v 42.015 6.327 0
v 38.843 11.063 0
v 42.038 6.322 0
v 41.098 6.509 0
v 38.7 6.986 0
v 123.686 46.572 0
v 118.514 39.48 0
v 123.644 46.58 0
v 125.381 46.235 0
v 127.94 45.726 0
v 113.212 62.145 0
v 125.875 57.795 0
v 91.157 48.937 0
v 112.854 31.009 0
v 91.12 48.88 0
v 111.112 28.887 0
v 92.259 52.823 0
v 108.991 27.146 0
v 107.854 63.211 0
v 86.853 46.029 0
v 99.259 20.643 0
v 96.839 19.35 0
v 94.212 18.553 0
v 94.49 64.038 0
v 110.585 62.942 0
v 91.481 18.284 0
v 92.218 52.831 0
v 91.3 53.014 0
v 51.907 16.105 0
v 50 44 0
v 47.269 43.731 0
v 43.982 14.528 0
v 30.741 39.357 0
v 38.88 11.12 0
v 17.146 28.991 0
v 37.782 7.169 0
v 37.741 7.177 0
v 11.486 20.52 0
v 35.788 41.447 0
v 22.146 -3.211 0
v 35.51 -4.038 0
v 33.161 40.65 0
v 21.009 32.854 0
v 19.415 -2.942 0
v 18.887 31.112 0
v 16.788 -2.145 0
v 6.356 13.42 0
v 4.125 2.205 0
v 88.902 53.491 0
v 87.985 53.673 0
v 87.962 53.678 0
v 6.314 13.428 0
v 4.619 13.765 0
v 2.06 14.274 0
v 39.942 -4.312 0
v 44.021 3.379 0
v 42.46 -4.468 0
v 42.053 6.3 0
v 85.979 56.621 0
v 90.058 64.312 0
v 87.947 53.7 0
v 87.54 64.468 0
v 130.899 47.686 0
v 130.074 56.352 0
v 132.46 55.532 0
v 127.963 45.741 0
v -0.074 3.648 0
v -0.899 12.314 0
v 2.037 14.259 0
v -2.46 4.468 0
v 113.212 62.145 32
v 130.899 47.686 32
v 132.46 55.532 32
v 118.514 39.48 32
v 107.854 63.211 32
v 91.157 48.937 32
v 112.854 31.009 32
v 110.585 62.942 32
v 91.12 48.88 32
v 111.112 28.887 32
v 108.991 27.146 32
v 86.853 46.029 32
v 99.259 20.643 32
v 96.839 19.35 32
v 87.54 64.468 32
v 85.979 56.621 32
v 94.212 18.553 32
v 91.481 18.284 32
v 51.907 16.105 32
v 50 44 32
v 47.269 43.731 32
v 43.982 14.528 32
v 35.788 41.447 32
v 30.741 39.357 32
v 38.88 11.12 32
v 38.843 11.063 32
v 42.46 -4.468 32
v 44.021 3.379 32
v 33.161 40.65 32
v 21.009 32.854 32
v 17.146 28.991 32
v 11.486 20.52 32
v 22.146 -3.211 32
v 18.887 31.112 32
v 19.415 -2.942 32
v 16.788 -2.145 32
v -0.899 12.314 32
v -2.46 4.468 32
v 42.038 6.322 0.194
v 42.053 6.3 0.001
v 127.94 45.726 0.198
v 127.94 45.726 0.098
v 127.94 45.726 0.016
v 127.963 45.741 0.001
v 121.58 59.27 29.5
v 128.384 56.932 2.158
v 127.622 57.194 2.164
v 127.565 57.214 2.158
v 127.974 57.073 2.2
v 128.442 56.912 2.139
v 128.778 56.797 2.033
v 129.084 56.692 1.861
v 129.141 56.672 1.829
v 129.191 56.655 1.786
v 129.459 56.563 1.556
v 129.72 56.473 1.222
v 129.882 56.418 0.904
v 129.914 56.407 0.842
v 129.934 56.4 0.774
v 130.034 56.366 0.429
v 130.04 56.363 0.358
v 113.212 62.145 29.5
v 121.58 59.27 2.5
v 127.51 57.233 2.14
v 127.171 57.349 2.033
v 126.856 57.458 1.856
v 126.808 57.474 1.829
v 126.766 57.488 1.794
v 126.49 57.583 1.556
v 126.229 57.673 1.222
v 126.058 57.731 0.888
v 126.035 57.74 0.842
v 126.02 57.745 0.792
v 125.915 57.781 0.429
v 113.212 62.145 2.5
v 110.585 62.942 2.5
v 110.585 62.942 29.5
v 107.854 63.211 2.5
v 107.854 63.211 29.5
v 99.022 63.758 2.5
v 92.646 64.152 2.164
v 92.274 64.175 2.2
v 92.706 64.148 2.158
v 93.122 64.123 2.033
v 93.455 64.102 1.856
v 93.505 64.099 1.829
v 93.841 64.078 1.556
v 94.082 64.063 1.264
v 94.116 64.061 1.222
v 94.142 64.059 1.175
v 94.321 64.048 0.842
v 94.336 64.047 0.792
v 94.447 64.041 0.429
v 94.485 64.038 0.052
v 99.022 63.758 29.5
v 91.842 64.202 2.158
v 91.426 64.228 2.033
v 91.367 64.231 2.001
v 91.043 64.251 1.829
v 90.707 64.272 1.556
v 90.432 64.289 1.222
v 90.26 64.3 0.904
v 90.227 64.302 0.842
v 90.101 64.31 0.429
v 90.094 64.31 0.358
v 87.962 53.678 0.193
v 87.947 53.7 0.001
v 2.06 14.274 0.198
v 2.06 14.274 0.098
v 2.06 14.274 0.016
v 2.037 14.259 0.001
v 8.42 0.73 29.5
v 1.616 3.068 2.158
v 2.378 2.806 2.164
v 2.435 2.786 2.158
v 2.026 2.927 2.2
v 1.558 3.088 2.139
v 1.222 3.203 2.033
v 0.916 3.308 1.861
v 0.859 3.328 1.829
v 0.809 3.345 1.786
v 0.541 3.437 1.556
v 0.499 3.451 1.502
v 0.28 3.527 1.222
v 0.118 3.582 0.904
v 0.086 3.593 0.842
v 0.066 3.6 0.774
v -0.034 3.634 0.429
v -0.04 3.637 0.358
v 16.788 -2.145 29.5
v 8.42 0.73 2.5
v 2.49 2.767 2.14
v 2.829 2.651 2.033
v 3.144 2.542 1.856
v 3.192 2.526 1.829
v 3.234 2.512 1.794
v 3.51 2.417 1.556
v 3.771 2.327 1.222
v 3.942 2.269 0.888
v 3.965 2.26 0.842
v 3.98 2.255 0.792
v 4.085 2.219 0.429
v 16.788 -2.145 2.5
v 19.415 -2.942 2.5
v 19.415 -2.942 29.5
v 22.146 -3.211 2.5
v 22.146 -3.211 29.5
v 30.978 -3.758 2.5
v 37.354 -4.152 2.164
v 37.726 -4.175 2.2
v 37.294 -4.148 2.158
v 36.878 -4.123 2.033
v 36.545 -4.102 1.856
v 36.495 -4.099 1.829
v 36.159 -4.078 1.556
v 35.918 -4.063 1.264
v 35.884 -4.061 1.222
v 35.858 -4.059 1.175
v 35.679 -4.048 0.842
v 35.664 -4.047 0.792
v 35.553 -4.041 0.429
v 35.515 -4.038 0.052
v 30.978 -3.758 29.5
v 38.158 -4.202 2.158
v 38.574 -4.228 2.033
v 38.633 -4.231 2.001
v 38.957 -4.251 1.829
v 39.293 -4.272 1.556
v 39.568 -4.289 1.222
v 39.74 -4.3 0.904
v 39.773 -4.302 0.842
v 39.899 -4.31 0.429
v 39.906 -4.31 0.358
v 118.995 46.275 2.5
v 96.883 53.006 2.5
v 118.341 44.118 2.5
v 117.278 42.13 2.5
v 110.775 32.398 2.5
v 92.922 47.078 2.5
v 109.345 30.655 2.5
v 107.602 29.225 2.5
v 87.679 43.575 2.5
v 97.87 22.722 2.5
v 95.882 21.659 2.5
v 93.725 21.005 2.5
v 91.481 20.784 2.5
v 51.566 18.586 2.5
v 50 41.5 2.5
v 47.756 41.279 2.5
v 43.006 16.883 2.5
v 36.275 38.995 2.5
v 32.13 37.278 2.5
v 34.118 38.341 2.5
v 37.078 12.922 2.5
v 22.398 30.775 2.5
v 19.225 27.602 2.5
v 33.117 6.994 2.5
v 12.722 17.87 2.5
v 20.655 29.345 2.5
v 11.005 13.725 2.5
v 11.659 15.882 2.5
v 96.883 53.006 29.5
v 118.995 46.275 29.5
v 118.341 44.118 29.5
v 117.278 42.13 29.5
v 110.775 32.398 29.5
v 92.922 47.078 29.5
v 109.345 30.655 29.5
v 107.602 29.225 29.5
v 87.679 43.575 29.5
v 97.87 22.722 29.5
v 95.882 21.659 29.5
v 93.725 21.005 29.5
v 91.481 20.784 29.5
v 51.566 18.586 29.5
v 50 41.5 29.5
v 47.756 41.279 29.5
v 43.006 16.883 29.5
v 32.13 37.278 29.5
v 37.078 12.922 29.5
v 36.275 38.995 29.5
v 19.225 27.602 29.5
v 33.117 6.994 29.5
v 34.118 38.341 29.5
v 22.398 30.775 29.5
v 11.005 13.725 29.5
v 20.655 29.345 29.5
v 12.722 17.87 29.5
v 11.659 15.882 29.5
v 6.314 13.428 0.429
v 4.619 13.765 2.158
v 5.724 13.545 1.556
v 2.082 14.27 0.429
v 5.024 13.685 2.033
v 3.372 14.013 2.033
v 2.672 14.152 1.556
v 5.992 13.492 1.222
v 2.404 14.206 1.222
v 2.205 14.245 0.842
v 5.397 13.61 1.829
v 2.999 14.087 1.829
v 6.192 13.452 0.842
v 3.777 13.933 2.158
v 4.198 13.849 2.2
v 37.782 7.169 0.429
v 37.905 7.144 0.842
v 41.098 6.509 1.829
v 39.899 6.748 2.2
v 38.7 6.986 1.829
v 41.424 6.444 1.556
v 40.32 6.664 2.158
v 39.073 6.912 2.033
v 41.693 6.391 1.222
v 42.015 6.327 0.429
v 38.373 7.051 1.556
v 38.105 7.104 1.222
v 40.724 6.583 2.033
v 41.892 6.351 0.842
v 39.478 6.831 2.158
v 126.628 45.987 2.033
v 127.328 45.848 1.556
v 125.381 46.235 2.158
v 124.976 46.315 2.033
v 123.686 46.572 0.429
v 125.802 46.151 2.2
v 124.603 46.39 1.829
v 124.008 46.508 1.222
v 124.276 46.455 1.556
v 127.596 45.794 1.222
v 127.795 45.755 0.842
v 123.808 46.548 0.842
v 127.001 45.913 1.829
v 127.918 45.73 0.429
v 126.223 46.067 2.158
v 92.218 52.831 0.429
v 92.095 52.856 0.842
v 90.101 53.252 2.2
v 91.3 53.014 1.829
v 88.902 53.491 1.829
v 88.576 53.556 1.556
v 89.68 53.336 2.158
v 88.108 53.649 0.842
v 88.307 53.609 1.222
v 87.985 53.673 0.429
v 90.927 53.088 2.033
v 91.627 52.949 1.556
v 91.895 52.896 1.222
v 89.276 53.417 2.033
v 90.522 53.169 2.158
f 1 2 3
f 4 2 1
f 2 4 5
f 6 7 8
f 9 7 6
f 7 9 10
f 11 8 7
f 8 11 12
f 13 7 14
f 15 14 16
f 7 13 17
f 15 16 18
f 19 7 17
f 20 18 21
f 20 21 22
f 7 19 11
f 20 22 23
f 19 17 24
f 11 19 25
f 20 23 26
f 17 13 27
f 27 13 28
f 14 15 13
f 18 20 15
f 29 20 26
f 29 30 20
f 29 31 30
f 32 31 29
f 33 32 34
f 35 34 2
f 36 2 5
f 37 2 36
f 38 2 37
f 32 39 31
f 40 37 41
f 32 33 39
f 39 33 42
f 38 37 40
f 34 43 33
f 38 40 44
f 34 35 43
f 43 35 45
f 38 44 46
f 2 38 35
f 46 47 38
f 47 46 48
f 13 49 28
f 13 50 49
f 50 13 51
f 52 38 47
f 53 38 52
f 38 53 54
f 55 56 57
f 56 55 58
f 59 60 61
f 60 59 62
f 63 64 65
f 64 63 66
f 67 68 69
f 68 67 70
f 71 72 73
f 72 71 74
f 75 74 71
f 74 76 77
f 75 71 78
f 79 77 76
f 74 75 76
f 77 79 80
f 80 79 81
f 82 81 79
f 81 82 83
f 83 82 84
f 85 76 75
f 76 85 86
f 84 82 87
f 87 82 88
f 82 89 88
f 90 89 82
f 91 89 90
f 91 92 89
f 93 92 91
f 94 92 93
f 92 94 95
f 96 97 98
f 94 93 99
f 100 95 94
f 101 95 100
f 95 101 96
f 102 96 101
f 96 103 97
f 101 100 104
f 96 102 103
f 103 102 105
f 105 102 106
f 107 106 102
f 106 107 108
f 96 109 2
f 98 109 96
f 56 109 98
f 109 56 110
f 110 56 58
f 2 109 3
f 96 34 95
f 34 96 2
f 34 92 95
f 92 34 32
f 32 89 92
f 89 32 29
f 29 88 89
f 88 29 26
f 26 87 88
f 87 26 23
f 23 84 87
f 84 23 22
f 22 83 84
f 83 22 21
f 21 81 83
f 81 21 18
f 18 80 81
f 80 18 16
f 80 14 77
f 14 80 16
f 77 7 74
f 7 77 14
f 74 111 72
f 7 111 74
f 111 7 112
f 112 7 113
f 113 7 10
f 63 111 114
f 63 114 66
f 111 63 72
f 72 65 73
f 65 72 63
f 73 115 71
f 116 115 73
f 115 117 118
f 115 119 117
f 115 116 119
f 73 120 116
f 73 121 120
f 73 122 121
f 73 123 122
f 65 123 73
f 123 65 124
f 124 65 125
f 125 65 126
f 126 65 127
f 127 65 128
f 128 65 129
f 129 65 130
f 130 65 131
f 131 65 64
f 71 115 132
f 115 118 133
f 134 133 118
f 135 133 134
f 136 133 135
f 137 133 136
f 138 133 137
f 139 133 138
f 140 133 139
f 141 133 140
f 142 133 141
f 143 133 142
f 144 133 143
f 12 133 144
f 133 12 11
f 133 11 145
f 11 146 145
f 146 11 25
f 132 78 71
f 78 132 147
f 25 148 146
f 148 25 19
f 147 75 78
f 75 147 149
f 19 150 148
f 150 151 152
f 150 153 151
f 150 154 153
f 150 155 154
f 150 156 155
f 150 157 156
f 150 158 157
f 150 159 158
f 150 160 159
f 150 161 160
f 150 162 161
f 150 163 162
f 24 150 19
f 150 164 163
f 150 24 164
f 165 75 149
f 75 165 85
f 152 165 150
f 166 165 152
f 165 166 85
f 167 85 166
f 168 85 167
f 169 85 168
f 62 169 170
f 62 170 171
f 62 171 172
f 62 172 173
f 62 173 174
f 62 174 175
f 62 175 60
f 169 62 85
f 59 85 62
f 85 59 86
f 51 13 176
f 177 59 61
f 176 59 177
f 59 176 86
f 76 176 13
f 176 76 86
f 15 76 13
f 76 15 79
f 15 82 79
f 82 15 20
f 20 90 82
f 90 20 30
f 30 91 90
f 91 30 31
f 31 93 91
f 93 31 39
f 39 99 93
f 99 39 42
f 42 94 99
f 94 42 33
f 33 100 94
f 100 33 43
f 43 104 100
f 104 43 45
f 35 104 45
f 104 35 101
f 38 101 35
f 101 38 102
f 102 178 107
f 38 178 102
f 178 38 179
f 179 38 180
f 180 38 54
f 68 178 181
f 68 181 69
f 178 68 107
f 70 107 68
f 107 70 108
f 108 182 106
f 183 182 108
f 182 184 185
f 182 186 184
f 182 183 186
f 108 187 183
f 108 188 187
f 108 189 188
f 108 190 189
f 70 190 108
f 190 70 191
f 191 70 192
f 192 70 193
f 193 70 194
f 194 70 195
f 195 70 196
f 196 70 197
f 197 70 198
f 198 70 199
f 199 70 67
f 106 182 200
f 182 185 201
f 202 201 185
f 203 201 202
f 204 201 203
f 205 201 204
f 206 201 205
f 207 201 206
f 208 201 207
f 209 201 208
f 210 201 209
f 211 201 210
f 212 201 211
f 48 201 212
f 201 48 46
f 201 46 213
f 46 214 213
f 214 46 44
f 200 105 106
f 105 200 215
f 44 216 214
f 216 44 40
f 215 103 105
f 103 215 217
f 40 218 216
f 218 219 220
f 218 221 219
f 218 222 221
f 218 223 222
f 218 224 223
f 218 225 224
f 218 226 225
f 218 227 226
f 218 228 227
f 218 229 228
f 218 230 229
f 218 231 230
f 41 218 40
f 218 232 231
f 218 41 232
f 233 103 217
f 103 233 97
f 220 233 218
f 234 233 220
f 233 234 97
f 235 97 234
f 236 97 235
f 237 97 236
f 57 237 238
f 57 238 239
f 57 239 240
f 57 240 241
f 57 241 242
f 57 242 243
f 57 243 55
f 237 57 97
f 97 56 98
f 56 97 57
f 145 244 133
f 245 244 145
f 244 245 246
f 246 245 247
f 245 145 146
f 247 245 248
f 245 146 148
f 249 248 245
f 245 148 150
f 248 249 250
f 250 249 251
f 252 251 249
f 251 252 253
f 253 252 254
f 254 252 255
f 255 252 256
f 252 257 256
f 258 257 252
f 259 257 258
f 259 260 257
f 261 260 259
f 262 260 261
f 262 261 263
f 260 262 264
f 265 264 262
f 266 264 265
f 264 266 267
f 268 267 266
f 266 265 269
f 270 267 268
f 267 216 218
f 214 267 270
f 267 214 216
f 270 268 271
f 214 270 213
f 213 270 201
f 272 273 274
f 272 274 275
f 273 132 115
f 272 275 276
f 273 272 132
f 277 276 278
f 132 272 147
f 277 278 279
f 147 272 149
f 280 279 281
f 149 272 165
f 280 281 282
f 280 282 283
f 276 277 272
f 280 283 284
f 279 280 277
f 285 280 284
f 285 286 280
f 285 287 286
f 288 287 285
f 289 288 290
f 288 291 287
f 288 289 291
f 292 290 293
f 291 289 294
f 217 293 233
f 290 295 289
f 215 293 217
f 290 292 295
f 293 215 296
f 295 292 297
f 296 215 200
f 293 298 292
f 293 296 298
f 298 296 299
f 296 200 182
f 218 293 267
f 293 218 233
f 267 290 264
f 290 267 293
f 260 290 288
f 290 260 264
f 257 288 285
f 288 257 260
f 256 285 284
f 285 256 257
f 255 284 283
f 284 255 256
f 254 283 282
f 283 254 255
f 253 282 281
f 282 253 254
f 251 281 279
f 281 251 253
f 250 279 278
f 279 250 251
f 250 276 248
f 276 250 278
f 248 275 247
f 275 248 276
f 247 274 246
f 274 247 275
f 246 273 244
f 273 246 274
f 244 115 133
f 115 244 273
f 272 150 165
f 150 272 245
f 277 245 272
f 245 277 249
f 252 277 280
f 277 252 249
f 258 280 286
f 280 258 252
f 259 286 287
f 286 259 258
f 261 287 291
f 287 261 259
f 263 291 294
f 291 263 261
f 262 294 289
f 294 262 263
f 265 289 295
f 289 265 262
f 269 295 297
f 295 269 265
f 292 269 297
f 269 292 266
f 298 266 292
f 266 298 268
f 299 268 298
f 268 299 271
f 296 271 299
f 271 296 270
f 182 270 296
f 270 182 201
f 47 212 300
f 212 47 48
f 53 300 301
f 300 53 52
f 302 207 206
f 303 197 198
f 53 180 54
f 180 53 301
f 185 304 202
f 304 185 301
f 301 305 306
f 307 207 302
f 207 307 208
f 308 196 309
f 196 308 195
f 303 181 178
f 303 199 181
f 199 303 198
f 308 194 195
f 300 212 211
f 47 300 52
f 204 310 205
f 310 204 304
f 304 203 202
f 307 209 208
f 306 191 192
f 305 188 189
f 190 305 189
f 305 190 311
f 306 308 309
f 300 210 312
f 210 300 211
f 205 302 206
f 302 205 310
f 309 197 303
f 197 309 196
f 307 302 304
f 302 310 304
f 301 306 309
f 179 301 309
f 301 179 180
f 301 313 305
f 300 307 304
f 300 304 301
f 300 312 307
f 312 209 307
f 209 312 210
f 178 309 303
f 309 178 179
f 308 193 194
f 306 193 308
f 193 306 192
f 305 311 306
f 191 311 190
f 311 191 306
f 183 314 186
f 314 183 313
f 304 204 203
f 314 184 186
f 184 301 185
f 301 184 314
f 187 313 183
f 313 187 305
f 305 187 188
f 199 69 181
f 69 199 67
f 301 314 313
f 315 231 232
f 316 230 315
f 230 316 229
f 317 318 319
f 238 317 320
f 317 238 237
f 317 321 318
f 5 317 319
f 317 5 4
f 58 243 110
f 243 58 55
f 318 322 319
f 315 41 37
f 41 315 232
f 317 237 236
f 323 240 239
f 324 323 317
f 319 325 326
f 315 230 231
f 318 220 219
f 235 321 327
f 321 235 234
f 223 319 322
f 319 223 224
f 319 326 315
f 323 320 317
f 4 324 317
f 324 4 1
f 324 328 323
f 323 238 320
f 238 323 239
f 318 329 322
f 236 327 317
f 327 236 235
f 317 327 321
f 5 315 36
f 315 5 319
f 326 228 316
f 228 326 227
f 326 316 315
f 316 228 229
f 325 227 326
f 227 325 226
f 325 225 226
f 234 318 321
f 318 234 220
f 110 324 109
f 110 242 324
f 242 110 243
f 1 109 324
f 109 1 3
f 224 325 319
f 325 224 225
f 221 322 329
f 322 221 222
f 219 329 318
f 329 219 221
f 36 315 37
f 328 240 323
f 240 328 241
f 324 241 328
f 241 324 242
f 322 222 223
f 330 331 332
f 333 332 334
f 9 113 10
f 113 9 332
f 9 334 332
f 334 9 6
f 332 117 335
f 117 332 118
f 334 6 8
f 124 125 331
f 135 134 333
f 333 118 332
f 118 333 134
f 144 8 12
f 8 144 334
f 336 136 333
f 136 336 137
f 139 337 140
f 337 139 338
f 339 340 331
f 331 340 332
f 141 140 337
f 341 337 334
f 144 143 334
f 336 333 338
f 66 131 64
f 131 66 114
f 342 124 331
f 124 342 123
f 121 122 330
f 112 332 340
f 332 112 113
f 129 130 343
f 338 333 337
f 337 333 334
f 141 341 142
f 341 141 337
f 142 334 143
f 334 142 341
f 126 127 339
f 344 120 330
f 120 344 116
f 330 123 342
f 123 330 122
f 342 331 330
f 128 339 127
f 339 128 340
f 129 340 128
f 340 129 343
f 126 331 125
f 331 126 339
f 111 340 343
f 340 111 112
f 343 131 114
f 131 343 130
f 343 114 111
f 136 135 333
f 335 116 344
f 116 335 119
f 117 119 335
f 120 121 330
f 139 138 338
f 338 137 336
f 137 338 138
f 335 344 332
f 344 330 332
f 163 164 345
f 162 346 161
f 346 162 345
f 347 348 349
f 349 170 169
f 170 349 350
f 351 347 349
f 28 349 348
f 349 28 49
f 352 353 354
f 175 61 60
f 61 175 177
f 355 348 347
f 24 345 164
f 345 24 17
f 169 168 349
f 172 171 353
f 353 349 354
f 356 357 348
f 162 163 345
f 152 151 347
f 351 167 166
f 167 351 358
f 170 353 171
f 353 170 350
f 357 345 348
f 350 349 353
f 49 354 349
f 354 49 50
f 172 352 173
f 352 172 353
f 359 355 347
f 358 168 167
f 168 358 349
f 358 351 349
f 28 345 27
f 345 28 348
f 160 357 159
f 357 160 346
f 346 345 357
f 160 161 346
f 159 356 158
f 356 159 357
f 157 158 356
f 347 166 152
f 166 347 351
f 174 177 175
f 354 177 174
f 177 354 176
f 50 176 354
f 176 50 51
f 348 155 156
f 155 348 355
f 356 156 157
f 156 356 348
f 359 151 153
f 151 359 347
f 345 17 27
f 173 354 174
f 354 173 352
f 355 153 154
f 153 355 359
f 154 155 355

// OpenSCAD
$fn = 32;

// ----------------------------------------------------------------------
// Air duct: 28 mm duct, 2.5 mm wall, 32 mm across
// ----------------------------------------------------------------------

// --- parameters (mm) ---
duct_r = 14;              // duct core radius
duct_d = 28;              // duct core diameter
wall = 2.5;               // duct wall thickness
height = 32;              // duct width (extrusion height)
port_r = 22.9;            // port flange half width
port_d = 45.8;            // port flange width
port_t = 8;               // port flange thickness
bolt_d = 4.4;             // port bolt holes
bolt_offset = 18.2;       // bolt hole offset from the port axis

difference() {
  /* outer hull chain: tube with a flat flange plate at every port */
  linear_extrude(height = 32) {
    hull() {
      polygon([[42.46, -4.468], [-2.46, 4.468], [-0.899, 12.314], [44.021, 3.379]]);
      translate([22.146, 10.789]) circle(r = 14);
    }
    hull() {
      translate([22.146, 10.789]) circle(r = 14);
      translate([22.284, 11.481]) circle(r = 14);
    }
    hull() {
      translate([22.284, 11.481]) circle(r = 14);
      translate([28.787, 21.213]) circle(r = 14);
    }
    hull() {
      translate([28.787, 21.213]) circle(r = 14);
      translate([38.519, 27.716]) circle(r = 14);
    }
    hull() {
      translate([38.519, 27.716]) circle(r = 14);
      translate([50, 30]) circle(r = 14);
    }
    hull() {
      translate([50, 30]) circle(r = 14);
      translate([91.481, 32.284]) circle(r = 14);
    }
    hull() {
      translate([91.481, 32.284]) circle(r = 14);
      translate([101.213, 38.787]) circle(r = 14);
    }
    hull() {
      translate([101.213, 38.787]) circle(r = 14);
      translate([107.716, 48.519]) circle(r = 14);
    }
    hull() {
      translate([107.716, 48.519]) circle(r = 14);
      translate([107.854, 49.211]) circle(r = 14);
    }
    hull() {
      translate([107.854, 49.211]) circle(r = 14);
      polygon([[87.54, 64.468], [132.46, 55.532], [130.899, 47.686], [85.979, 56.621]]);
    }
  }
  /* air passage: the same chain inset by the wall, 5 mm proud of the ports */
  translate([0, 0, 2.5]) linear_extrude(height = 27) {
    hull() {
      translate([19.025, -4.904]) circle(r = 11.5);
      translate([22.284, 11.481]) circle(r = 11.5);
    }
    hull() {
      translate([22.284, 11.481]) circle(r = 11.5);
      translate([28.787, 21.213]) circle(r = 11.5);
    }
    hull() {
      translate([28.787, 21.213]) circle(r = 11.5);
      translate([38.519, 27.716]) circle(r = 11.5);
    }
    hull() {
      translate([38.519, 27.716]) circle(r = 11.5);
      translate([50, 30]) circle(r = 11.5);
    }
    hull() {
      translate([50, 30]) circle(r = 11.5);
      translate([91.481, 32.284]) circle(r = 11.5);
    }
    hull() {
      translate([91.481, 32.284]) circle(r = 11.5);
      translate([101.213, 38.787]) circle(r = 11.5);
    }
    hull() {
      translate([101.213, 38.787]) circle(r = 11.5);
      translate([107.716, 48.519]) circle(r = 11.5);
    }
    hull() {
      translate([107.716, 48.519]) circle(r = 11.5);
      translate([110.975, 64.904]) circle(r = 11.5);
    }
  }
  translate([20, 0]) rotate([0, 0, -11.25]) translate([-18.2, -2.5]) rotate([-90, 0, 0]) cylinder(h = 13, d = 4.4);
  translate([20, 0]) rotate([0, 0, -11.25]) translate([18.2, -2.5]) rotate([-90, 0, 0]) cylinder(h = 13, d = 4.4);
  translate([110, 60]) rotate([0, 0, 168.75]) translate([-18.2, -2.5]) rotate([-90, 0, 0]) cylinder(h = 13, d = 4.4);
  translate([110, 60]) rotate([0, 0, 168.75]) translate([18.2, -2.5]) rotate([-90, 0, 0]) cylinder(h = 13, d = 4.4);
}
